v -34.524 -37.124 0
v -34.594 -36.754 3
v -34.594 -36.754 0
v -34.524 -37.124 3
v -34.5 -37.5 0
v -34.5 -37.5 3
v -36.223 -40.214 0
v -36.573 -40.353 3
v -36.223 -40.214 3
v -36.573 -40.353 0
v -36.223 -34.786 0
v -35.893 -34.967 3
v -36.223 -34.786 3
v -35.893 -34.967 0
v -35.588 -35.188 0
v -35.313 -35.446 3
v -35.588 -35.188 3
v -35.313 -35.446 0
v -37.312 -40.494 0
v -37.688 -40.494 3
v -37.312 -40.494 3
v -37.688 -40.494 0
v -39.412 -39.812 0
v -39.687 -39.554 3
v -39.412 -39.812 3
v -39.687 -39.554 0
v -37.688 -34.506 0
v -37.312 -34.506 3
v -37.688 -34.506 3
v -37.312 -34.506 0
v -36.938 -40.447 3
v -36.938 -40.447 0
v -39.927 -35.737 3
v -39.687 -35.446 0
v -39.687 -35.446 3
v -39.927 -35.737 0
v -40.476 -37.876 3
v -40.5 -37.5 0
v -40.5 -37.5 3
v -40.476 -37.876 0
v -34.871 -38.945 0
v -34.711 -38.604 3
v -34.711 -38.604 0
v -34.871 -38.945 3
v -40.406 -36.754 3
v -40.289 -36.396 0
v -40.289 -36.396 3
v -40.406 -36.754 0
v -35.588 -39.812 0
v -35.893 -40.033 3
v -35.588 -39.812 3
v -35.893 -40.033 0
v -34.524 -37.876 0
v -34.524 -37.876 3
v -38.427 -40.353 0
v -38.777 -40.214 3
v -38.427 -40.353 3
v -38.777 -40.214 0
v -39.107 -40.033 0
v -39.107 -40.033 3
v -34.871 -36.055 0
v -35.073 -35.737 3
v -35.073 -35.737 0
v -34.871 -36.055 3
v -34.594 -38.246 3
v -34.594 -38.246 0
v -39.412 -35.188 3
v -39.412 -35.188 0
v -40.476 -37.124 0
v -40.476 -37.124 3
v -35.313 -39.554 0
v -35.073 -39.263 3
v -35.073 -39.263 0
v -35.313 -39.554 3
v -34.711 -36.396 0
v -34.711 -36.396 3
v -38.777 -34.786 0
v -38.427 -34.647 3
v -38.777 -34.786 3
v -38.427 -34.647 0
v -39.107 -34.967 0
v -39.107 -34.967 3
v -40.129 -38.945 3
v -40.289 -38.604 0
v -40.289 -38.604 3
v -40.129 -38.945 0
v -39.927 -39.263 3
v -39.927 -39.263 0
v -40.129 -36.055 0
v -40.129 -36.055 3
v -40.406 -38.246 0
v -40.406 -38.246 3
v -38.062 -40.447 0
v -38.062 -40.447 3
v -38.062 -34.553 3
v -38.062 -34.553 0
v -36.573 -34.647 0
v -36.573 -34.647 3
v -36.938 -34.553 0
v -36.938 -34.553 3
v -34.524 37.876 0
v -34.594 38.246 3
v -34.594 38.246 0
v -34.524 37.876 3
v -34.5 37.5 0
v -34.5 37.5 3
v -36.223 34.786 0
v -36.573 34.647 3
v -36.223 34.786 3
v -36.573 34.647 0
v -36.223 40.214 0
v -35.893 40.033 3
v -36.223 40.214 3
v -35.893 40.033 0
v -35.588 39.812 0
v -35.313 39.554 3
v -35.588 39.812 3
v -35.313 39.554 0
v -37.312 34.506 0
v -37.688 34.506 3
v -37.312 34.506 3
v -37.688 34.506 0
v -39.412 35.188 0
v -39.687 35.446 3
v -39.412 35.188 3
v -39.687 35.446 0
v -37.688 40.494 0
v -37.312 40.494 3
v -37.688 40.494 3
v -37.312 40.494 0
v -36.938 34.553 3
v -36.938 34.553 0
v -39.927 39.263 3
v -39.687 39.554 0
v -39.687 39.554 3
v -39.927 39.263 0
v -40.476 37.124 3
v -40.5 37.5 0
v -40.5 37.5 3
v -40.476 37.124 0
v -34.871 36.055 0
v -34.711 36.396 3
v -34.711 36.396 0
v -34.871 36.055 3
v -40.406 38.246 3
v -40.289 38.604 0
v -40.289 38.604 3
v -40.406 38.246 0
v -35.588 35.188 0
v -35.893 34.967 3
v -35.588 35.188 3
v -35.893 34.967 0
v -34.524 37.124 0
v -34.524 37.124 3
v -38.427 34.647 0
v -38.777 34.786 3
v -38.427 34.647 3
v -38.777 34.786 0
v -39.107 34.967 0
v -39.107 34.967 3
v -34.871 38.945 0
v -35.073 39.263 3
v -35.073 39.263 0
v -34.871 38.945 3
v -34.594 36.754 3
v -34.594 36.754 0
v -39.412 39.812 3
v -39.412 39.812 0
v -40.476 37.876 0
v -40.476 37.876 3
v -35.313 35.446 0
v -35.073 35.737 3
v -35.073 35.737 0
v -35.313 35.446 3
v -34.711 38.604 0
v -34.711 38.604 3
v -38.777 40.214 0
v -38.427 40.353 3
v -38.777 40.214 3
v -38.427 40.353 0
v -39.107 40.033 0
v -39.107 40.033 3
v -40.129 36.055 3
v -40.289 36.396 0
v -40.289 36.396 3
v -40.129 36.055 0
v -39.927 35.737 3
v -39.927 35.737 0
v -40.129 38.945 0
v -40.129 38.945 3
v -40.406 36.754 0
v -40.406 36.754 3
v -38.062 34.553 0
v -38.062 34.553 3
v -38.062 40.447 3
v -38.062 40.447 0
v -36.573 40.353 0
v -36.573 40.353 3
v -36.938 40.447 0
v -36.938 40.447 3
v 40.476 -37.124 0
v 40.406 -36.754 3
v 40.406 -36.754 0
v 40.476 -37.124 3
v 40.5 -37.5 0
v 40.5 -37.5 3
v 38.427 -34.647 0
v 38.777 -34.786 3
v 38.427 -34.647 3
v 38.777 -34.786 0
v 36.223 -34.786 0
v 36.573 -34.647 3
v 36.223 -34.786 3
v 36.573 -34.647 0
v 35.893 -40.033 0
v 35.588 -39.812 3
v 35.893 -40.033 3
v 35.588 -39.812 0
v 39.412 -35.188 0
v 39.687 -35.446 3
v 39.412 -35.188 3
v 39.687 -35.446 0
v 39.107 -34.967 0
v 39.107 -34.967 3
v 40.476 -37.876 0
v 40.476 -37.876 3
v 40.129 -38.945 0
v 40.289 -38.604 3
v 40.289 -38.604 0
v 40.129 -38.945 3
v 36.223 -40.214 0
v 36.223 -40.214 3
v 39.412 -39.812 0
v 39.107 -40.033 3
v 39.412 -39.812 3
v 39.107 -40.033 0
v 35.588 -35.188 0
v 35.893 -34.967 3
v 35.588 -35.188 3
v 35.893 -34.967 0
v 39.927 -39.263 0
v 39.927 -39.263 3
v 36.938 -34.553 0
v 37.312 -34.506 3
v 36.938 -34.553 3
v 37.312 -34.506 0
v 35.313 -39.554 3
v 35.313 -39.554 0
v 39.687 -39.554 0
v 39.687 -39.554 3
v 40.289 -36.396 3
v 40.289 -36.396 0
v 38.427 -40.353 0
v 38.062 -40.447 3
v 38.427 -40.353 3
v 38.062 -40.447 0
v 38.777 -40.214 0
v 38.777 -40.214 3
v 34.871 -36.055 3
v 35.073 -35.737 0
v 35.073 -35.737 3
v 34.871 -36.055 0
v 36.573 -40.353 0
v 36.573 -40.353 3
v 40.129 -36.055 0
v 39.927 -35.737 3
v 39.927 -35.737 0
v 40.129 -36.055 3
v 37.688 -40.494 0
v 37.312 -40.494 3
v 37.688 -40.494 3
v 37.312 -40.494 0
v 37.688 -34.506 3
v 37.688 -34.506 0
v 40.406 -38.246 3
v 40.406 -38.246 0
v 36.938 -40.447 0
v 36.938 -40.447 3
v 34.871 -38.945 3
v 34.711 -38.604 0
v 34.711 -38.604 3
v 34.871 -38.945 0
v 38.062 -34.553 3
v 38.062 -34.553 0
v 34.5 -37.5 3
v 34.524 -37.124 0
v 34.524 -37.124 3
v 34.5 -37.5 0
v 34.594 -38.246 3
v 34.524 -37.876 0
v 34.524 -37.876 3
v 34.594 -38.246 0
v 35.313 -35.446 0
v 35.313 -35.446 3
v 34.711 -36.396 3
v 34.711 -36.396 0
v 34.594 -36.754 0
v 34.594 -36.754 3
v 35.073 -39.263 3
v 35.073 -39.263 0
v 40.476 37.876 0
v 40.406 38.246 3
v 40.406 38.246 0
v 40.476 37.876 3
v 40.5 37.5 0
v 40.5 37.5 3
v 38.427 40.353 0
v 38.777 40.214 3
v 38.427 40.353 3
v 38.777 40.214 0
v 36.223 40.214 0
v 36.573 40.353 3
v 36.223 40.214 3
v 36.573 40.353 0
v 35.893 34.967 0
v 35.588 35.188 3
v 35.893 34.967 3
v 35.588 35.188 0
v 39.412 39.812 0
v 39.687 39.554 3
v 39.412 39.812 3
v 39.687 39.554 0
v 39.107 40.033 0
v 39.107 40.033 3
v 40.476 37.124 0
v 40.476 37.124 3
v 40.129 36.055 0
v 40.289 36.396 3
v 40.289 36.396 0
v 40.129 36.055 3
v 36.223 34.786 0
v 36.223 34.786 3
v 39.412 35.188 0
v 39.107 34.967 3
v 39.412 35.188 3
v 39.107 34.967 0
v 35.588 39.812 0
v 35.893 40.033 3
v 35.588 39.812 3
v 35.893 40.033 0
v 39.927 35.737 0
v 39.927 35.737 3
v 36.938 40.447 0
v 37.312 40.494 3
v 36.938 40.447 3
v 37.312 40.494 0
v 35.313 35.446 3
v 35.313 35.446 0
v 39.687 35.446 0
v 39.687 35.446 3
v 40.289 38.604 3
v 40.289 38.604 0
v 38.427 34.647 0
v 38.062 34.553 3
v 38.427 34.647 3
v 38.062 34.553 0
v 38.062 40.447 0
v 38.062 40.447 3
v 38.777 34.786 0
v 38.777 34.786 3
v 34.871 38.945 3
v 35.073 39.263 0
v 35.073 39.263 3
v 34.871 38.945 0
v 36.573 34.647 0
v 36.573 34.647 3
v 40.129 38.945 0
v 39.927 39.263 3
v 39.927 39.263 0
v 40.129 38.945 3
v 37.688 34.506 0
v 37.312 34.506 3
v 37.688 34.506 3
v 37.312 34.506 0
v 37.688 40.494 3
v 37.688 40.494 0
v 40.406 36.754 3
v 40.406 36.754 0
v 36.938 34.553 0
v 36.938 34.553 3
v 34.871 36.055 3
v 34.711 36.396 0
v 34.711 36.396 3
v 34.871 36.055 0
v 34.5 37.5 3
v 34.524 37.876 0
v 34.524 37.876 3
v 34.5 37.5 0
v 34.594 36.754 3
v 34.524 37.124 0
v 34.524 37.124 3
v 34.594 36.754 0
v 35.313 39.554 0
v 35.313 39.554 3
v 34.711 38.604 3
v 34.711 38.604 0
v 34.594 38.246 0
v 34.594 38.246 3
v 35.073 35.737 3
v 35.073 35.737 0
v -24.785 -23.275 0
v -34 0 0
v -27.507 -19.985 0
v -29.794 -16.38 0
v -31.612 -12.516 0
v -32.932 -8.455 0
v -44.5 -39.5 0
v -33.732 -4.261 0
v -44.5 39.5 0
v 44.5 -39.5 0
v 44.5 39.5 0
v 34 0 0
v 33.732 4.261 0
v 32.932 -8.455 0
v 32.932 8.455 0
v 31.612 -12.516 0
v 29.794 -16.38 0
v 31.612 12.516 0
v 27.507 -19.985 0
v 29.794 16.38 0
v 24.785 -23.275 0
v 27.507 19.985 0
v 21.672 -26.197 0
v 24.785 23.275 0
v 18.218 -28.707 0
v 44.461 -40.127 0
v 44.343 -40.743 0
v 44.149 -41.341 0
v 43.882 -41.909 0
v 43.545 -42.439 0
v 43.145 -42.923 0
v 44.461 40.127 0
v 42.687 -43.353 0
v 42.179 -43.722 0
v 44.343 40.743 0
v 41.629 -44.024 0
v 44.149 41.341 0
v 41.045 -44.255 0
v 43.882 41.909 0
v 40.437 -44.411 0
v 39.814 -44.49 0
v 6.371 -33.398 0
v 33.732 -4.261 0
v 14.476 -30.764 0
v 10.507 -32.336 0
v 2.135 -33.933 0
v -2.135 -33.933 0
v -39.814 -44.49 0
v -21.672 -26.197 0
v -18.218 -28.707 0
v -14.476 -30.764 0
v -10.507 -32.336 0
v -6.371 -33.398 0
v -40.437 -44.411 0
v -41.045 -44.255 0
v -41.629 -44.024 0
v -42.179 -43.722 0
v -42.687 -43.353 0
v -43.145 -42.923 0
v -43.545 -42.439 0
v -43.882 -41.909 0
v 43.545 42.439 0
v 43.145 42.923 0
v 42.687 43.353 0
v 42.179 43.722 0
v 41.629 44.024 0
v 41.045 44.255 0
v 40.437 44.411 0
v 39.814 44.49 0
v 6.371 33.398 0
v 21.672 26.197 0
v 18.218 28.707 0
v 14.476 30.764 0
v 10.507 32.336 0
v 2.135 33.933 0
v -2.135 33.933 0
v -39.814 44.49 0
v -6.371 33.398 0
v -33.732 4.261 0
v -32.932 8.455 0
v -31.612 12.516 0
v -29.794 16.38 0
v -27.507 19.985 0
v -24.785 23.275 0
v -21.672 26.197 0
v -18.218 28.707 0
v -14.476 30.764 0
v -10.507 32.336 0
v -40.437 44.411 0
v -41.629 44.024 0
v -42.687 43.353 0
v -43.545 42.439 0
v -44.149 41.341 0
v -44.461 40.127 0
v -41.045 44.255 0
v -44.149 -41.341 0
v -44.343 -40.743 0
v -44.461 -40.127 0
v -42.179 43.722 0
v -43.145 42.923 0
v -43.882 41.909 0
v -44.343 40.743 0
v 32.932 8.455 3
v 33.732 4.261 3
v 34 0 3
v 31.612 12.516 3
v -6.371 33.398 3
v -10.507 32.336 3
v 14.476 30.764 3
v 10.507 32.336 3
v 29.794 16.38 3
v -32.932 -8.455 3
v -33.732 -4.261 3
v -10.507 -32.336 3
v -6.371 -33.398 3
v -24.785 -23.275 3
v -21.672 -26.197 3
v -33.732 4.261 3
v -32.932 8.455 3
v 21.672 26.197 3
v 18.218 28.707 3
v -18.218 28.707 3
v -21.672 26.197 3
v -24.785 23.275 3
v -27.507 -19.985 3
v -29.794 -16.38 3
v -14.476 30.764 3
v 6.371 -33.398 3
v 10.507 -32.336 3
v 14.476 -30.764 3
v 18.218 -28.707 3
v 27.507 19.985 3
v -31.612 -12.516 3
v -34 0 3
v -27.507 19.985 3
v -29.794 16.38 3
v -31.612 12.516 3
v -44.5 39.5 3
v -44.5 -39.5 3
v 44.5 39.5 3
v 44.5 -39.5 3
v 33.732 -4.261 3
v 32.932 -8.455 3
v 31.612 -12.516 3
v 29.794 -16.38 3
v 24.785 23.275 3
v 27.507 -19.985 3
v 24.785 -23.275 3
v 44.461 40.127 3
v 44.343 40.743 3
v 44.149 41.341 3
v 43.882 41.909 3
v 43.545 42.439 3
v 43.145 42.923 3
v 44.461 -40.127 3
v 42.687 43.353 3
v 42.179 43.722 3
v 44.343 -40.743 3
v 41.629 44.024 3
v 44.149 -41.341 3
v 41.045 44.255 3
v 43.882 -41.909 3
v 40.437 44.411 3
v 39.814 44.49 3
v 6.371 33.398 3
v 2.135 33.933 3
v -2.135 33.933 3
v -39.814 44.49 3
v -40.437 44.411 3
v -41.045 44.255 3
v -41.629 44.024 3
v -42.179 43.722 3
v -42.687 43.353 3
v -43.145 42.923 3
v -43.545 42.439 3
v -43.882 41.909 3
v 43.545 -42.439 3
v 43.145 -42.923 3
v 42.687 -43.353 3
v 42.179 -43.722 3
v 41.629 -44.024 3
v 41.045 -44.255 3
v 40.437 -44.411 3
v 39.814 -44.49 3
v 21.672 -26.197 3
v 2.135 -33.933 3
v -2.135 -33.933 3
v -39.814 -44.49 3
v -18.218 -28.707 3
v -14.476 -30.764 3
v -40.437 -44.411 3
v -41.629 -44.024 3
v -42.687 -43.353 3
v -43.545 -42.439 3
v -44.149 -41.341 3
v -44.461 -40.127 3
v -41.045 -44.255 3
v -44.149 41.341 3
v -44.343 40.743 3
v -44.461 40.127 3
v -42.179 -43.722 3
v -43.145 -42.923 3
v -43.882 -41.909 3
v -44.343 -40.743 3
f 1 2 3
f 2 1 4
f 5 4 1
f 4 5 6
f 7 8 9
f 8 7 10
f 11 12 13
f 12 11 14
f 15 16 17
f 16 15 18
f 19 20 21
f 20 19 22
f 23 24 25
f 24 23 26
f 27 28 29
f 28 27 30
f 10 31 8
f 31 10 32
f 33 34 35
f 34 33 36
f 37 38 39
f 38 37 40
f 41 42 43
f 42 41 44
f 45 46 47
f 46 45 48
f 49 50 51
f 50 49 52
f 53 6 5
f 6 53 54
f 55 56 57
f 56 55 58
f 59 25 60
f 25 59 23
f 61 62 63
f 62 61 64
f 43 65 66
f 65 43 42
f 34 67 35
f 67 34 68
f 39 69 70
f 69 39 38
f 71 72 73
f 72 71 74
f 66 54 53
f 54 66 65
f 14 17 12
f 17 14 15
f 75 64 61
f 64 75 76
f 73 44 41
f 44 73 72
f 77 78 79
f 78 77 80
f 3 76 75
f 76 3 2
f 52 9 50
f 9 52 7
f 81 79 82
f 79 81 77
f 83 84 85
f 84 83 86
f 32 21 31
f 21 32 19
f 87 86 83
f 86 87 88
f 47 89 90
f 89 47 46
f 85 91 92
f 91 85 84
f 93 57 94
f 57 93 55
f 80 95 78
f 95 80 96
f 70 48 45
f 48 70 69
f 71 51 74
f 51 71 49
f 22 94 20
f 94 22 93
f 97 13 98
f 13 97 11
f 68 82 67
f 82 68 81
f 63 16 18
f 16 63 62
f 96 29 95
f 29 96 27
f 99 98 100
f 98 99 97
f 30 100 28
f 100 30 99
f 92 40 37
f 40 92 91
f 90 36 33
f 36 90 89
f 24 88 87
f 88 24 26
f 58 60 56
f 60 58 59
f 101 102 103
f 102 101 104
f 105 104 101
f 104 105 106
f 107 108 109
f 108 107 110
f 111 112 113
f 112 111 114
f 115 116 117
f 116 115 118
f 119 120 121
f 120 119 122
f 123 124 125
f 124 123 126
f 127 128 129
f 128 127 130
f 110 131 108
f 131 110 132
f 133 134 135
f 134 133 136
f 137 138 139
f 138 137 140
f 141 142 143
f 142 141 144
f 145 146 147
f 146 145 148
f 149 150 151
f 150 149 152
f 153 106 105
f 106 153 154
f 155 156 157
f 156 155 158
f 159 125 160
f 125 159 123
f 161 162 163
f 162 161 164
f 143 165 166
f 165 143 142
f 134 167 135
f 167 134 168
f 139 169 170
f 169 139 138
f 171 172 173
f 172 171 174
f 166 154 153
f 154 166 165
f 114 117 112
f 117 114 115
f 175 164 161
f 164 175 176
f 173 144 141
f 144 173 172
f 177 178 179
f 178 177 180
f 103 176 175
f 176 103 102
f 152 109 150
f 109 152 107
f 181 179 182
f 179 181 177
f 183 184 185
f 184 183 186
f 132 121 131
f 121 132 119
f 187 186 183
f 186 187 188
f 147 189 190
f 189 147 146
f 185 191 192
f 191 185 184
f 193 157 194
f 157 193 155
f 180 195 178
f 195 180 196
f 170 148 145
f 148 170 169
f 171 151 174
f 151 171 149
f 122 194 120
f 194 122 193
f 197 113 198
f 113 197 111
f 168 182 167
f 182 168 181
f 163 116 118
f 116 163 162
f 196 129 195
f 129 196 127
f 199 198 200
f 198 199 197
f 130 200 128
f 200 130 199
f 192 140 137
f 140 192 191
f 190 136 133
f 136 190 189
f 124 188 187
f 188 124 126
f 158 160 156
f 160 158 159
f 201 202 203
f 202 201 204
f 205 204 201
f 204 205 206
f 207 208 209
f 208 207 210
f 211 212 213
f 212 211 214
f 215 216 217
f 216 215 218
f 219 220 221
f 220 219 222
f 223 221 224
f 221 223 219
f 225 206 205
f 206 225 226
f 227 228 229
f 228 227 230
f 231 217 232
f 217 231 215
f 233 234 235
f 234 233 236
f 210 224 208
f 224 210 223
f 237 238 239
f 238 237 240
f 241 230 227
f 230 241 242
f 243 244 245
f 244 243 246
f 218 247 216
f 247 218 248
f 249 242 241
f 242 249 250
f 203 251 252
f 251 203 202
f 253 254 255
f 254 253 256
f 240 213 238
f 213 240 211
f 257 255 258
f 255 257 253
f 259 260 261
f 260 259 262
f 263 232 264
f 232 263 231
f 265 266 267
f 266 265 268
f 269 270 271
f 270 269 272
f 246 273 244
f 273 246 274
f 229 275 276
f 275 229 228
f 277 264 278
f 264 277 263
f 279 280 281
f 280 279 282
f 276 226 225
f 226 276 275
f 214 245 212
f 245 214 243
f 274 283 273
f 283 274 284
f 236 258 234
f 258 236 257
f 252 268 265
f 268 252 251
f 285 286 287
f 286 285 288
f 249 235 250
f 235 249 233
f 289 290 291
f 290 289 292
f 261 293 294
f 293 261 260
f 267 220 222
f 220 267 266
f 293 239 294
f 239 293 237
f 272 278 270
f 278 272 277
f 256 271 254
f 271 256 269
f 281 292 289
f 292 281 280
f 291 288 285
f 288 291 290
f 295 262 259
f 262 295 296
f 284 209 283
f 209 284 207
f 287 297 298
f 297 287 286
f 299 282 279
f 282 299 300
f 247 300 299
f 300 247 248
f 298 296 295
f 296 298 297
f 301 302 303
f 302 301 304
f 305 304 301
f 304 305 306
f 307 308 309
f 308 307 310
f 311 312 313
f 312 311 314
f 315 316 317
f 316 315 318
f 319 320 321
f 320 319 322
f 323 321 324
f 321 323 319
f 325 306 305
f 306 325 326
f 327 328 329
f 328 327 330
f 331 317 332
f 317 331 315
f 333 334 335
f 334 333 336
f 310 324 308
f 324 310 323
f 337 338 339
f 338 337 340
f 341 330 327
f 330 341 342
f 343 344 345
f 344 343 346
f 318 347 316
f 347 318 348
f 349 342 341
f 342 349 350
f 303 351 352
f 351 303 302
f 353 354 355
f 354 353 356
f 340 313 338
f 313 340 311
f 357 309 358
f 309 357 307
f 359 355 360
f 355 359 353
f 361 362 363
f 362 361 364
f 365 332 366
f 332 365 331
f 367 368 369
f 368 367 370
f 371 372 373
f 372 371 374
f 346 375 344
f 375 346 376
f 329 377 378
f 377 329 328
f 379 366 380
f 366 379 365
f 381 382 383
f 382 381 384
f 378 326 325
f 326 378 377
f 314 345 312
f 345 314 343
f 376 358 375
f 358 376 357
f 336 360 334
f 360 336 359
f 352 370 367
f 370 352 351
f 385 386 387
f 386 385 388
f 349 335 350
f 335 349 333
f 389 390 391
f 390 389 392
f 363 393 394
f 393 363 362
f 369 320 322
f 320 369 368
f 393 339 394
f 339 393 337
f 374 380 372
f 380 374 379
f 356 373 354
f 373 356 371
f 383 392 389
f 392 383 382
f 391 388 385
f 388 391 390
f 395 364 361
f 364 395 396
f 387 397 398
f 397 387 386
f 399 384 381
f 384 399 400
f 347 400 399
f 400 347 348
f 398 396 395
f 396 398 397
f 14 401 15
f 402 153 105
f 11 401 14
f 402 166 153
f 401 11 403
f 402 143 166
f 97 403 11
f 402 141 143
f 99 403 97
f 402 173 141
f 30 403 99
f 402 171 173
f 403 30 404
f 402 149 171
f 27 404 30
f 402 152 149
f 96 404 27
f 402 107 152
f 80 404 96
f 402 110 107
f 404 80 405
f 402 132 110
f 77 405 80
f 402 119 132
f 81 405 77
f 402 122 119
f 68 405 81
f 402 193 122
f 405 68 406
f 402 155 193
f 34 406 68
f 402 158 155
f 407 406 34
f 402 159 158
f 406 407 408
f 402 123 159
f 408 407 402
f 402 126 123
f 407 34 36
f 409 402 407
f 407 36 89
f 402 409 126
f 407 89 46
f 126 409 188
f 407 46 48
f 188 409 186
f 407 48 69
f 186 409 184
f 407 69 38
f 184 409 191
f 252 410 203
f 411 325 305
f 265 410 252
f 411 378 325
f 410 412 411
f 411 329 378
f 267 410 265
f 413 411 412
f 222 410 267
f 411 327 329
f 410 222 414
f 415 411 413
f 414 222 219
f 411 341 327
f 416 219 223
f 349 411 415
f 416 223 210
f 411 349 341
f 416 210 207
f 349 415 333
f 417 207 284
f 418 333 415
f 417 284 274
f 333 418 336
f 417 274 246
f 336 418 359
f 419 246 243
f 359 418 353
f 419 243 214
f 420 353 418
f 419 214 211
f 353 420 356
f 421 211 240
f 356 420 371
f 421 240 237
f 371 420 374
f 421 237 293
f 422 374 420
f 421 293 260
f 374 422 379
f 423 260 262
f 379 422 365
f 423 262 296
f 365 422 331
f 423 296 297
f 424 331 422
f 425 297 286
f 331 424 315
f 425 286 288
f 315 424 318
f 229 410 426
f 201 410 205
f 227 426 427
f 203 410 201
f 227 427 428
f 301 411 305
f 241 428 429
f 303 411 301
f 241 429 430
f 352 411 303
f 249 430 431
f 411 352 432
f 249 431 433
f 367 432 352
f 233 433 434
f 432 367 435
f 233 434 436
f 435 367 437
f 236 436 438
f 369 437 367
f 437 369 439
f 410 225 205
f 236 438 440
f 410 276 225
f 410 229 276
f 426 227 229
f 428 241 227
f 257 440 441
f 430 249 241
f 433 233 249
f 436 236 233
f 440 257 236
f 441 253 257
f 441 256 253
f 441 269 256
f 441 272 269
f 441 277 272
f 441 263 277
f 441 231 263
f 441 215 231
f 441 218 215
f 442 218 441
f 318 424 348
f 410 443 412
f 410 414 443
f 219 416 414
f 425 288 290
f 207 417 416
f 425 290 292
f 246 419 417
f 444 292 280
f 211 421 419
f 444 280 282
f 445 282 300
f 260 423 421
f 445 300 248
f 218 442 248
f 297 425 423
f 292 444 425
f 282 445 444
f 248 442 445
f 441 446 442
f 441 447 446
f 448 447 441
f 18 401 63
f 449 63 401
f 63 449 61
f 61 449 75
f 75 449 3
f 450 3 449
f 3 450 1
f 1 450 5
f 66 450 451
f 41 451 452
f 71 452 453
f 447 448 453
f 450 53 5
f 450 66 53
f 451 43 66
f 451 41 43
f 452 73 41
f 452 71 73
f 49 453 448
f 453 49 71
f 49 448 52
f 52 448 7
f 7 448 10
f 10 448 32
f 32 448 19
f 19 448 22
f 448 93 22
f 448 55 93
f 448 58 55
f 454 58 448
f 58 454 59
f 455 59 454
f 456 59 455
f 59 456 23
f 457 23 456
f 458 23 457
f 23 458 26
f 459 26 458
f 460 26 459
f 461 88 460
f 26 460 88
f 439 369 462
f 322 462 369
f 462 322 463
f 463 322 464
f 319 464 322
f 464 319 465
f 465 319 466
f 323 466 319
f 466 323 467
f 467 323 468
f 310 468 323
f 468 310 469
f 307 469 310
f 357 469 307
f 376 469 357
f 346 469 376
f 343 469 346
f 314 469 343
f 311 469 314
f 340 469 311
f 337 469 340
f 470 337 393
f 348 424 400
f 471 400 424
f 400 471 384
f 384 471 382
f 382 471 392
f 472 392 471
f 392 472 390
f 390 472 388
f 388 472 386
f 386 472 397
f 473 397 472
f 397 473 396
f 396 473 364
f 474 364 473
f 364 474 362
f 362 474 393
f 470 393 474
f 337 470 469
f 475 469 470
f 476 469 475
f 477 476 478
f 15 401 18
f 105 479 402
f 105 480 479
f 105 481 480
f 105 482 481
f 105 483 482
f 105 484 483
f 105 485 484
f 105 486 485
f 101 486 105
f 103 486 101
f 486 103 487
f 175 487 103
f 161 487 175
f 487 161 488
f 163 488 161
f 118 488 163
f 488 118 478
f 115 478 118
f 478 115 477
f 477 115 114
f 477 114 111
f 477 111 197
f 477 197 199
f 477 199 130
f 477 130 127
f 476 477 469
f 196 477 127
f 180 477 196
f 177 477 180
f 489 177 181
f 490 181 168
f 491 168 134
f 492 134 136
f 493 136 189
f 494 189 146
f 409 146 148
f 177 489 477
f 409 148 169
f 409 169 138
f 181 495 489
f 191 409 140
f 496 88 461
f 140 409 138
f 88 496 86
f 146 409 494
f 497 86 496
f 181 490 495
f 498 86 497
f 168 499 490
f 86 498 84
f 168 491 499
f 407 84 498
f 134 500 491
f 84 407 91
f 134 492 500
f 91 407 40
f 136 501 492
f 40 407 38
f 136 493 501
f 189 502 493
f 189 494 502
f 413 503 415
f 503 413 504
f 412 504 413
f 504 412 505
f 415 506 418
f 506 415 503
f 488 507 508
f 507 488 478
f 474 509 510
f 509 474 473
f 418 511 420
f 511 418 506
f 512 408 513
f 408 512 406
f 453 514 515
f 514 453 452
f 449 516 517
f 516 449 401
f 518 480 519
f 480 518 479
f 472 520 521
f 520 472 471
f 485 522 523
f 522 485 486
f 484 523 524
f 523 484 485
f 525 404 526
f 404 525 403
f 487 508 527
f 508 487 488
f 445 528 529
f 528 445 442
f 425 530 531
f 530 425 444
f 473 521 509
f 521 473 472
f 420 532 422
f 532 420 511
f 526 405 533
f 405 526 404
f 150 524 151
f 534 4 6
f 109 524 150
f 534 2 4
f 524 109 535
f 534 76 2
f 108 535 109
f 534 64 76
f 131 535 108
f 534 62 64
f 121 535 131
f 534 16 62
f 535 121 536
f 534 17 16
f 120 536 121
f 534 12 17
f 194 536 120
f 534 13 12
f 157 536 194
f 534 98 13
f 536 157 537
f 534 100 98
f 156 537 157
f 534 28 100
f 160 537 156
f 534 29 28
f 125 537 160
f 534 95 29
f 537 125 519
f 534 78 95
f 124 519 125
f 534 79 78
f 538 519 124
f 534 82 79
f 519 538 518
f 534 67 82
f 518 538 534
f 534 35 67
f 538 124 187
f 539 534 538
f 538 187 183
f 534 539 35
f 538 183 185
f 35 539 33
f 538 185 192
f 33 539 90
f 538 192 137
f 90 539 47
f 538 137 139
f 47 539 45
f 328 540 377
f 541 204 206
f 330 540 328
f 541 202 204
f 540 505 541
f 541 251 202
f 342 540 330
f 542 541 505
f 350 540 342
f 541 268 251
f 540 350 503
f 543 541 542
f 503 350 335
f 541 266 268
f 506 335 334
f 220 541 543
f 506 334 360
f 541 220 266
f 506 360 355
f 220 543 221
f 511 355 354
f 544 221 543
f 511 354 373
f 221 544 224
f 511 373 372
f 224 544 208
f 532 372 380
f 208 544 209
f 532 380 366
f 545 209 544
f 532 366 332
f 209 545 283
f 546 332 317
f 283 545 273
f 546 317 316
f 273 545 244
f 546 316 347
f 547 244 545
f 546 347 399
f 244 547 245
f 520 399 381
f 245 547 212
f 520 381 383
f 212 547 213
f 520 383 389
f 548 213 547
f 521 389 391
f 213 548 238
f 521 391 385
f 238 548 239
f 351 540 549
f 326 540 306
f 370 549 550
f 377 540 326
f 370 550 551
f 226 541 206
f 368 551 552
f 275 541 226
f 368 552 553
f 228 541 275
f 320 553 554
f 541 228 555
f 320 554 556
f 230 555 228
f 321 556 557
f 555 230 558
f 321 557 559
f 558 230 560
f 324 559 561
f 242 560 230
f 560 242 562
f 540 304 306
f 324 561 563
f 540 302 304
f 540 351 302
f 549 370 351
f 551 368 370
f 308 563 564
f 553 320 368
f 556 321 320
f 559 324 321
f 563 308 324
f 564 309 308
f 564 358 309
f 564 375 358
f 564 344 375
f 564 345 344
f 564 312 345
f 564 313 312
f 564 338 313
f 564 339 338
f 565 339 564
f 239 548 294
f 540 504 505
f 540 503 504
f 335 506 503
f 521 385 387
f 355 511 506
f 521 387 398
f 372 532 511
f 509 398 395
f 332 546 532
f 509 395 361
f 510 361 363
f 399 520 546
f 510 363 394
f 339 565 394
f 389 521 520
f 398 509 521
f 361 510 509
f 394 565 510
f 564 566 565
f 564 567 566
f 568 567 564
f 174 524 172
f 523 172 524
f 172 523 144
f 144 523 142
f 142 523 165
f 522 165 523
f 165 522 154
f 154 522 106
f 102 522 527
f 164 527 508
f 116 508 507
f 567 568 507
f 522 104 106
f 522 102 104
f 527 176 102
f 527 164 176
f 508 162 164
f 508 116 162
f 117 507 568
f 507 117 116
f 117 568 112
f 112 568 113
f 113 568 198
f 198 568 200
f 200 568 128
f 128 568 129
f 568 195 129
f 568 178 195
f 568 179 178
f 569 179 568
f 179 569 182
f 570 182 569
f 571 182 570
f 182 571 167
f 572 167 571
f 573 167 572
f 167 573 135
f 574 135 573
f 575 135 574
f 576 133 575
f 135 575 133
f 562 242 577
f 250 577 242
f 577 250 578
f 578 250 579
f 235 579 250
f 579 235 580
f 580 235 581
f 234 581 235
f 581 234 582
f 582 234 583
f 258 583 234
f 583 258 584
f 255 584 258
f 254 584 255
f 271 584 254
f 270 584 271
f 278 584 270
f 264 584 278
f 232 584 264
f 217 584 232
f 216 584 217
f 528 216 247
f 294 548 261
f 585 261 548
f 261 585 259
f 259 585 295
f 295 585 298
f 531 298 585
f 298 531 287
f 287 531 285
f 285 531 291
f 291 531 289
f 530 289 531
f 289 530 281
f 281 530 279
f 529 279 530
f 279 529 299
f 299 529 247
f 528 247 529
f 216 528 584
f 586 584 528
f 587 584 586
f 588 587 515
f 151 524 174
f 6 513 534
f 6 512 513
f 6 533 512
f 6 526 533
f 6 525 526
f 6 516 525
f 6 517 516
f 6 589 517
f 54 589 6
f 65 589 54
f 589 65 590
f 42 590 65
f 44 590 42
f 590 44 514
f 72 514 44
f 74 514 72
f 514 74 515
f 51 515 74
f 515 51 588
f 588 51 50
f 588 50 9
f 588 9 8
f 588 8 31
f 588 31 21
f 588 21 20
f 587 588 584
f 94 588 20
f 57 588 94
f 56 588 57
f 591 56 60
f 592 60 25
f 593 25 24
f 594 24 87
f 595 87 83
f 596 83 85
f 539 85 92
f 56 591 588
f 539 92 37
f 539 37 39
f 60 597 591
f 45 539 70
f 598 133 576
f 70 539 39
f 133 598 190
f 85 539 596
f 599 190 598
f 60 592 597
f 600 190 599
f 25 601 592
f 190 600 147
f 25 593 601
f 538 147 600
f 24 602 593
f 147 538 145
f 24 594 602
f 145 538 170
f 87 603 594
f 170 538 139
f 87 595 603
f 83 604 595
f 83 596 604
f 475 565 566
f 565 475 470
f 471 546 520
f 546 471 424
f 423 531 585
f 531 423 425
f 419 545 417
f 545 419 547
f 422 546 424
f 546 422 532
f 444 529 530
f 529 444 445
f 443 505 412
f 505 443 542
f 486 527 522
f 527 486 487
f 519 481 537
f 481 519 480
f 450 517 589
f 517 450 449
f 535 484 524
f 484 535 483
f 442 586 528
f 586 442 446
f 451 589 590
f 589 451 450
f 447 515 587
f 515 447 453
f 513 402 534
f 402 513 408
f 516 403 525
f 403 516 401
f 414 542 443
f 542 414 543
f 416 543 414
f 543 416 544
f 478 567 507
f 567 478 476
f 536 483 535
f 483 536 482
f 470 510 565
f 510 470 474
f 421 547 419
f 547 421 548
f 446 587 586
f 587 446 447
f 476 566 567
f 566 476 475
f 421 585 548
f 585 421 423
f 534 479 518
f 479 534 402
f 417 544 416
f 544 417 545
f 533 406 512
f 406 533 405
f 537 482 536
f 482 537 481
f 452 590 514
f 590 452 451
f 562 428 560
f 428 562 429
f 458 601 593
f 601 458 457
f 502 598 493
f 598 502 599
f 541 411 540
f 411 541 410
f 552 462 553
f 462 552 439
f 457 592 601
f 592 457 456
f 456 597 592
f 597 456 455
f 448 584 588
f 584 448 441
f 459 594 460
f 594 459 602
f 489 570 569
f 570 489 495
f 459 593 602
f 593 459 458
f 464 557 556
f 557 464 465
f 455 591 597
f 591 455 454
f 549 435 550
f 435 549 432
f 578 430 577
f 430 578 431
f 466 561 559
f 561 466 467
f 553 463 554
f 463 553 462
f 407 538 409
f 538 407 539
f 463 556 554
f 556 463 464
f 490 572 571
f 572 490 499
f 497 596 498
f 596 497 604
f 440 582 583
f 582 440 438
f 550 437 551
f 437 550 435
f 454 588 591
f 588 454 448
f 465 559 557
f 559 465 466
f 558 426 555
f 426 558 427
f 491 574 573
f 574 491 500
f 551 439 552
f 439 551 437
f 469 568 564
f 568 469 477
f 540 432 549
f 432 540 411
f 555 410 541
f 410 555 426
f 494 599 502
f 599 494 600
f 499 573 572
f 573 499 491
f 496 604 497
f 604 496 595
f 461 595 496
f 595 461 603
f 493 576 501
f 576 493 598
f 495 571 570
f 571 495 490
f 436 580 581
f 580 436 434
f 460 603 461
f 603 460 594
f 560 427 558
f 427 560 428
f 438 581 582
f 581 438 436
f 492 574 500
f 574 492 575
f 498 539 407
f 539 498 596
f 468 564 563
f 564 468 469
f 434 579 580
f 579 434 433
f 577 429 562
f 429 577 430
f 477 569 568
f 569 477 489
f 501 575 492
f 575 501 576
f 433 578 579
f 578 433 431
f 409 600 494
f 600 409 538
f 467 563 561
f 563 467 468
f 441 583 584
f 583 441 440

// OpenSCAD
$fn = 50;


difference() {
	union() {
		hull() {
			translate(v = [-39.5000000000, 39.5000000000, 0]) {
				cylinder(h = 3, r = 5);
			}
			translate(v = [39.5000000000, 39.5000000000, 0]) {
				cylinder(h = 3, r = 5);
			}
			translate(v = [-39.5000000000, -39.5000000000, 0]) {
				cylinder(h = 3, r = 5);
			}
			translate(v = [39.5000000000, -39.5000000000, 0]) {
				cylinder(h = 3, r = 5);
			}
		}
	}
	union() {
		#translate(v = [-37.5000000000, -37.5000000000, -100.0000000000]) {
			cylinder(h = 200, r = 3.0000000000);
		}
		#translate(v = [-37.5000000000, 37.5000000000, -100.0000000000]) {
			cylinder(h = 200, r = 3.0000000000);
		}
		#translate(v = [37.5000000000, -37.5000000000, -100.0000000000]) {
			cylinder(h = 200, r = 3.0000000000);
		}
		#translate(v = [37.5000000000, 37.5000000000, -100.0000000000]) {
			cylinder(h = 200, r = 3.0000000000);
		}
		#cylinder(h = 3, r = 34.0000000000);
	}
}
